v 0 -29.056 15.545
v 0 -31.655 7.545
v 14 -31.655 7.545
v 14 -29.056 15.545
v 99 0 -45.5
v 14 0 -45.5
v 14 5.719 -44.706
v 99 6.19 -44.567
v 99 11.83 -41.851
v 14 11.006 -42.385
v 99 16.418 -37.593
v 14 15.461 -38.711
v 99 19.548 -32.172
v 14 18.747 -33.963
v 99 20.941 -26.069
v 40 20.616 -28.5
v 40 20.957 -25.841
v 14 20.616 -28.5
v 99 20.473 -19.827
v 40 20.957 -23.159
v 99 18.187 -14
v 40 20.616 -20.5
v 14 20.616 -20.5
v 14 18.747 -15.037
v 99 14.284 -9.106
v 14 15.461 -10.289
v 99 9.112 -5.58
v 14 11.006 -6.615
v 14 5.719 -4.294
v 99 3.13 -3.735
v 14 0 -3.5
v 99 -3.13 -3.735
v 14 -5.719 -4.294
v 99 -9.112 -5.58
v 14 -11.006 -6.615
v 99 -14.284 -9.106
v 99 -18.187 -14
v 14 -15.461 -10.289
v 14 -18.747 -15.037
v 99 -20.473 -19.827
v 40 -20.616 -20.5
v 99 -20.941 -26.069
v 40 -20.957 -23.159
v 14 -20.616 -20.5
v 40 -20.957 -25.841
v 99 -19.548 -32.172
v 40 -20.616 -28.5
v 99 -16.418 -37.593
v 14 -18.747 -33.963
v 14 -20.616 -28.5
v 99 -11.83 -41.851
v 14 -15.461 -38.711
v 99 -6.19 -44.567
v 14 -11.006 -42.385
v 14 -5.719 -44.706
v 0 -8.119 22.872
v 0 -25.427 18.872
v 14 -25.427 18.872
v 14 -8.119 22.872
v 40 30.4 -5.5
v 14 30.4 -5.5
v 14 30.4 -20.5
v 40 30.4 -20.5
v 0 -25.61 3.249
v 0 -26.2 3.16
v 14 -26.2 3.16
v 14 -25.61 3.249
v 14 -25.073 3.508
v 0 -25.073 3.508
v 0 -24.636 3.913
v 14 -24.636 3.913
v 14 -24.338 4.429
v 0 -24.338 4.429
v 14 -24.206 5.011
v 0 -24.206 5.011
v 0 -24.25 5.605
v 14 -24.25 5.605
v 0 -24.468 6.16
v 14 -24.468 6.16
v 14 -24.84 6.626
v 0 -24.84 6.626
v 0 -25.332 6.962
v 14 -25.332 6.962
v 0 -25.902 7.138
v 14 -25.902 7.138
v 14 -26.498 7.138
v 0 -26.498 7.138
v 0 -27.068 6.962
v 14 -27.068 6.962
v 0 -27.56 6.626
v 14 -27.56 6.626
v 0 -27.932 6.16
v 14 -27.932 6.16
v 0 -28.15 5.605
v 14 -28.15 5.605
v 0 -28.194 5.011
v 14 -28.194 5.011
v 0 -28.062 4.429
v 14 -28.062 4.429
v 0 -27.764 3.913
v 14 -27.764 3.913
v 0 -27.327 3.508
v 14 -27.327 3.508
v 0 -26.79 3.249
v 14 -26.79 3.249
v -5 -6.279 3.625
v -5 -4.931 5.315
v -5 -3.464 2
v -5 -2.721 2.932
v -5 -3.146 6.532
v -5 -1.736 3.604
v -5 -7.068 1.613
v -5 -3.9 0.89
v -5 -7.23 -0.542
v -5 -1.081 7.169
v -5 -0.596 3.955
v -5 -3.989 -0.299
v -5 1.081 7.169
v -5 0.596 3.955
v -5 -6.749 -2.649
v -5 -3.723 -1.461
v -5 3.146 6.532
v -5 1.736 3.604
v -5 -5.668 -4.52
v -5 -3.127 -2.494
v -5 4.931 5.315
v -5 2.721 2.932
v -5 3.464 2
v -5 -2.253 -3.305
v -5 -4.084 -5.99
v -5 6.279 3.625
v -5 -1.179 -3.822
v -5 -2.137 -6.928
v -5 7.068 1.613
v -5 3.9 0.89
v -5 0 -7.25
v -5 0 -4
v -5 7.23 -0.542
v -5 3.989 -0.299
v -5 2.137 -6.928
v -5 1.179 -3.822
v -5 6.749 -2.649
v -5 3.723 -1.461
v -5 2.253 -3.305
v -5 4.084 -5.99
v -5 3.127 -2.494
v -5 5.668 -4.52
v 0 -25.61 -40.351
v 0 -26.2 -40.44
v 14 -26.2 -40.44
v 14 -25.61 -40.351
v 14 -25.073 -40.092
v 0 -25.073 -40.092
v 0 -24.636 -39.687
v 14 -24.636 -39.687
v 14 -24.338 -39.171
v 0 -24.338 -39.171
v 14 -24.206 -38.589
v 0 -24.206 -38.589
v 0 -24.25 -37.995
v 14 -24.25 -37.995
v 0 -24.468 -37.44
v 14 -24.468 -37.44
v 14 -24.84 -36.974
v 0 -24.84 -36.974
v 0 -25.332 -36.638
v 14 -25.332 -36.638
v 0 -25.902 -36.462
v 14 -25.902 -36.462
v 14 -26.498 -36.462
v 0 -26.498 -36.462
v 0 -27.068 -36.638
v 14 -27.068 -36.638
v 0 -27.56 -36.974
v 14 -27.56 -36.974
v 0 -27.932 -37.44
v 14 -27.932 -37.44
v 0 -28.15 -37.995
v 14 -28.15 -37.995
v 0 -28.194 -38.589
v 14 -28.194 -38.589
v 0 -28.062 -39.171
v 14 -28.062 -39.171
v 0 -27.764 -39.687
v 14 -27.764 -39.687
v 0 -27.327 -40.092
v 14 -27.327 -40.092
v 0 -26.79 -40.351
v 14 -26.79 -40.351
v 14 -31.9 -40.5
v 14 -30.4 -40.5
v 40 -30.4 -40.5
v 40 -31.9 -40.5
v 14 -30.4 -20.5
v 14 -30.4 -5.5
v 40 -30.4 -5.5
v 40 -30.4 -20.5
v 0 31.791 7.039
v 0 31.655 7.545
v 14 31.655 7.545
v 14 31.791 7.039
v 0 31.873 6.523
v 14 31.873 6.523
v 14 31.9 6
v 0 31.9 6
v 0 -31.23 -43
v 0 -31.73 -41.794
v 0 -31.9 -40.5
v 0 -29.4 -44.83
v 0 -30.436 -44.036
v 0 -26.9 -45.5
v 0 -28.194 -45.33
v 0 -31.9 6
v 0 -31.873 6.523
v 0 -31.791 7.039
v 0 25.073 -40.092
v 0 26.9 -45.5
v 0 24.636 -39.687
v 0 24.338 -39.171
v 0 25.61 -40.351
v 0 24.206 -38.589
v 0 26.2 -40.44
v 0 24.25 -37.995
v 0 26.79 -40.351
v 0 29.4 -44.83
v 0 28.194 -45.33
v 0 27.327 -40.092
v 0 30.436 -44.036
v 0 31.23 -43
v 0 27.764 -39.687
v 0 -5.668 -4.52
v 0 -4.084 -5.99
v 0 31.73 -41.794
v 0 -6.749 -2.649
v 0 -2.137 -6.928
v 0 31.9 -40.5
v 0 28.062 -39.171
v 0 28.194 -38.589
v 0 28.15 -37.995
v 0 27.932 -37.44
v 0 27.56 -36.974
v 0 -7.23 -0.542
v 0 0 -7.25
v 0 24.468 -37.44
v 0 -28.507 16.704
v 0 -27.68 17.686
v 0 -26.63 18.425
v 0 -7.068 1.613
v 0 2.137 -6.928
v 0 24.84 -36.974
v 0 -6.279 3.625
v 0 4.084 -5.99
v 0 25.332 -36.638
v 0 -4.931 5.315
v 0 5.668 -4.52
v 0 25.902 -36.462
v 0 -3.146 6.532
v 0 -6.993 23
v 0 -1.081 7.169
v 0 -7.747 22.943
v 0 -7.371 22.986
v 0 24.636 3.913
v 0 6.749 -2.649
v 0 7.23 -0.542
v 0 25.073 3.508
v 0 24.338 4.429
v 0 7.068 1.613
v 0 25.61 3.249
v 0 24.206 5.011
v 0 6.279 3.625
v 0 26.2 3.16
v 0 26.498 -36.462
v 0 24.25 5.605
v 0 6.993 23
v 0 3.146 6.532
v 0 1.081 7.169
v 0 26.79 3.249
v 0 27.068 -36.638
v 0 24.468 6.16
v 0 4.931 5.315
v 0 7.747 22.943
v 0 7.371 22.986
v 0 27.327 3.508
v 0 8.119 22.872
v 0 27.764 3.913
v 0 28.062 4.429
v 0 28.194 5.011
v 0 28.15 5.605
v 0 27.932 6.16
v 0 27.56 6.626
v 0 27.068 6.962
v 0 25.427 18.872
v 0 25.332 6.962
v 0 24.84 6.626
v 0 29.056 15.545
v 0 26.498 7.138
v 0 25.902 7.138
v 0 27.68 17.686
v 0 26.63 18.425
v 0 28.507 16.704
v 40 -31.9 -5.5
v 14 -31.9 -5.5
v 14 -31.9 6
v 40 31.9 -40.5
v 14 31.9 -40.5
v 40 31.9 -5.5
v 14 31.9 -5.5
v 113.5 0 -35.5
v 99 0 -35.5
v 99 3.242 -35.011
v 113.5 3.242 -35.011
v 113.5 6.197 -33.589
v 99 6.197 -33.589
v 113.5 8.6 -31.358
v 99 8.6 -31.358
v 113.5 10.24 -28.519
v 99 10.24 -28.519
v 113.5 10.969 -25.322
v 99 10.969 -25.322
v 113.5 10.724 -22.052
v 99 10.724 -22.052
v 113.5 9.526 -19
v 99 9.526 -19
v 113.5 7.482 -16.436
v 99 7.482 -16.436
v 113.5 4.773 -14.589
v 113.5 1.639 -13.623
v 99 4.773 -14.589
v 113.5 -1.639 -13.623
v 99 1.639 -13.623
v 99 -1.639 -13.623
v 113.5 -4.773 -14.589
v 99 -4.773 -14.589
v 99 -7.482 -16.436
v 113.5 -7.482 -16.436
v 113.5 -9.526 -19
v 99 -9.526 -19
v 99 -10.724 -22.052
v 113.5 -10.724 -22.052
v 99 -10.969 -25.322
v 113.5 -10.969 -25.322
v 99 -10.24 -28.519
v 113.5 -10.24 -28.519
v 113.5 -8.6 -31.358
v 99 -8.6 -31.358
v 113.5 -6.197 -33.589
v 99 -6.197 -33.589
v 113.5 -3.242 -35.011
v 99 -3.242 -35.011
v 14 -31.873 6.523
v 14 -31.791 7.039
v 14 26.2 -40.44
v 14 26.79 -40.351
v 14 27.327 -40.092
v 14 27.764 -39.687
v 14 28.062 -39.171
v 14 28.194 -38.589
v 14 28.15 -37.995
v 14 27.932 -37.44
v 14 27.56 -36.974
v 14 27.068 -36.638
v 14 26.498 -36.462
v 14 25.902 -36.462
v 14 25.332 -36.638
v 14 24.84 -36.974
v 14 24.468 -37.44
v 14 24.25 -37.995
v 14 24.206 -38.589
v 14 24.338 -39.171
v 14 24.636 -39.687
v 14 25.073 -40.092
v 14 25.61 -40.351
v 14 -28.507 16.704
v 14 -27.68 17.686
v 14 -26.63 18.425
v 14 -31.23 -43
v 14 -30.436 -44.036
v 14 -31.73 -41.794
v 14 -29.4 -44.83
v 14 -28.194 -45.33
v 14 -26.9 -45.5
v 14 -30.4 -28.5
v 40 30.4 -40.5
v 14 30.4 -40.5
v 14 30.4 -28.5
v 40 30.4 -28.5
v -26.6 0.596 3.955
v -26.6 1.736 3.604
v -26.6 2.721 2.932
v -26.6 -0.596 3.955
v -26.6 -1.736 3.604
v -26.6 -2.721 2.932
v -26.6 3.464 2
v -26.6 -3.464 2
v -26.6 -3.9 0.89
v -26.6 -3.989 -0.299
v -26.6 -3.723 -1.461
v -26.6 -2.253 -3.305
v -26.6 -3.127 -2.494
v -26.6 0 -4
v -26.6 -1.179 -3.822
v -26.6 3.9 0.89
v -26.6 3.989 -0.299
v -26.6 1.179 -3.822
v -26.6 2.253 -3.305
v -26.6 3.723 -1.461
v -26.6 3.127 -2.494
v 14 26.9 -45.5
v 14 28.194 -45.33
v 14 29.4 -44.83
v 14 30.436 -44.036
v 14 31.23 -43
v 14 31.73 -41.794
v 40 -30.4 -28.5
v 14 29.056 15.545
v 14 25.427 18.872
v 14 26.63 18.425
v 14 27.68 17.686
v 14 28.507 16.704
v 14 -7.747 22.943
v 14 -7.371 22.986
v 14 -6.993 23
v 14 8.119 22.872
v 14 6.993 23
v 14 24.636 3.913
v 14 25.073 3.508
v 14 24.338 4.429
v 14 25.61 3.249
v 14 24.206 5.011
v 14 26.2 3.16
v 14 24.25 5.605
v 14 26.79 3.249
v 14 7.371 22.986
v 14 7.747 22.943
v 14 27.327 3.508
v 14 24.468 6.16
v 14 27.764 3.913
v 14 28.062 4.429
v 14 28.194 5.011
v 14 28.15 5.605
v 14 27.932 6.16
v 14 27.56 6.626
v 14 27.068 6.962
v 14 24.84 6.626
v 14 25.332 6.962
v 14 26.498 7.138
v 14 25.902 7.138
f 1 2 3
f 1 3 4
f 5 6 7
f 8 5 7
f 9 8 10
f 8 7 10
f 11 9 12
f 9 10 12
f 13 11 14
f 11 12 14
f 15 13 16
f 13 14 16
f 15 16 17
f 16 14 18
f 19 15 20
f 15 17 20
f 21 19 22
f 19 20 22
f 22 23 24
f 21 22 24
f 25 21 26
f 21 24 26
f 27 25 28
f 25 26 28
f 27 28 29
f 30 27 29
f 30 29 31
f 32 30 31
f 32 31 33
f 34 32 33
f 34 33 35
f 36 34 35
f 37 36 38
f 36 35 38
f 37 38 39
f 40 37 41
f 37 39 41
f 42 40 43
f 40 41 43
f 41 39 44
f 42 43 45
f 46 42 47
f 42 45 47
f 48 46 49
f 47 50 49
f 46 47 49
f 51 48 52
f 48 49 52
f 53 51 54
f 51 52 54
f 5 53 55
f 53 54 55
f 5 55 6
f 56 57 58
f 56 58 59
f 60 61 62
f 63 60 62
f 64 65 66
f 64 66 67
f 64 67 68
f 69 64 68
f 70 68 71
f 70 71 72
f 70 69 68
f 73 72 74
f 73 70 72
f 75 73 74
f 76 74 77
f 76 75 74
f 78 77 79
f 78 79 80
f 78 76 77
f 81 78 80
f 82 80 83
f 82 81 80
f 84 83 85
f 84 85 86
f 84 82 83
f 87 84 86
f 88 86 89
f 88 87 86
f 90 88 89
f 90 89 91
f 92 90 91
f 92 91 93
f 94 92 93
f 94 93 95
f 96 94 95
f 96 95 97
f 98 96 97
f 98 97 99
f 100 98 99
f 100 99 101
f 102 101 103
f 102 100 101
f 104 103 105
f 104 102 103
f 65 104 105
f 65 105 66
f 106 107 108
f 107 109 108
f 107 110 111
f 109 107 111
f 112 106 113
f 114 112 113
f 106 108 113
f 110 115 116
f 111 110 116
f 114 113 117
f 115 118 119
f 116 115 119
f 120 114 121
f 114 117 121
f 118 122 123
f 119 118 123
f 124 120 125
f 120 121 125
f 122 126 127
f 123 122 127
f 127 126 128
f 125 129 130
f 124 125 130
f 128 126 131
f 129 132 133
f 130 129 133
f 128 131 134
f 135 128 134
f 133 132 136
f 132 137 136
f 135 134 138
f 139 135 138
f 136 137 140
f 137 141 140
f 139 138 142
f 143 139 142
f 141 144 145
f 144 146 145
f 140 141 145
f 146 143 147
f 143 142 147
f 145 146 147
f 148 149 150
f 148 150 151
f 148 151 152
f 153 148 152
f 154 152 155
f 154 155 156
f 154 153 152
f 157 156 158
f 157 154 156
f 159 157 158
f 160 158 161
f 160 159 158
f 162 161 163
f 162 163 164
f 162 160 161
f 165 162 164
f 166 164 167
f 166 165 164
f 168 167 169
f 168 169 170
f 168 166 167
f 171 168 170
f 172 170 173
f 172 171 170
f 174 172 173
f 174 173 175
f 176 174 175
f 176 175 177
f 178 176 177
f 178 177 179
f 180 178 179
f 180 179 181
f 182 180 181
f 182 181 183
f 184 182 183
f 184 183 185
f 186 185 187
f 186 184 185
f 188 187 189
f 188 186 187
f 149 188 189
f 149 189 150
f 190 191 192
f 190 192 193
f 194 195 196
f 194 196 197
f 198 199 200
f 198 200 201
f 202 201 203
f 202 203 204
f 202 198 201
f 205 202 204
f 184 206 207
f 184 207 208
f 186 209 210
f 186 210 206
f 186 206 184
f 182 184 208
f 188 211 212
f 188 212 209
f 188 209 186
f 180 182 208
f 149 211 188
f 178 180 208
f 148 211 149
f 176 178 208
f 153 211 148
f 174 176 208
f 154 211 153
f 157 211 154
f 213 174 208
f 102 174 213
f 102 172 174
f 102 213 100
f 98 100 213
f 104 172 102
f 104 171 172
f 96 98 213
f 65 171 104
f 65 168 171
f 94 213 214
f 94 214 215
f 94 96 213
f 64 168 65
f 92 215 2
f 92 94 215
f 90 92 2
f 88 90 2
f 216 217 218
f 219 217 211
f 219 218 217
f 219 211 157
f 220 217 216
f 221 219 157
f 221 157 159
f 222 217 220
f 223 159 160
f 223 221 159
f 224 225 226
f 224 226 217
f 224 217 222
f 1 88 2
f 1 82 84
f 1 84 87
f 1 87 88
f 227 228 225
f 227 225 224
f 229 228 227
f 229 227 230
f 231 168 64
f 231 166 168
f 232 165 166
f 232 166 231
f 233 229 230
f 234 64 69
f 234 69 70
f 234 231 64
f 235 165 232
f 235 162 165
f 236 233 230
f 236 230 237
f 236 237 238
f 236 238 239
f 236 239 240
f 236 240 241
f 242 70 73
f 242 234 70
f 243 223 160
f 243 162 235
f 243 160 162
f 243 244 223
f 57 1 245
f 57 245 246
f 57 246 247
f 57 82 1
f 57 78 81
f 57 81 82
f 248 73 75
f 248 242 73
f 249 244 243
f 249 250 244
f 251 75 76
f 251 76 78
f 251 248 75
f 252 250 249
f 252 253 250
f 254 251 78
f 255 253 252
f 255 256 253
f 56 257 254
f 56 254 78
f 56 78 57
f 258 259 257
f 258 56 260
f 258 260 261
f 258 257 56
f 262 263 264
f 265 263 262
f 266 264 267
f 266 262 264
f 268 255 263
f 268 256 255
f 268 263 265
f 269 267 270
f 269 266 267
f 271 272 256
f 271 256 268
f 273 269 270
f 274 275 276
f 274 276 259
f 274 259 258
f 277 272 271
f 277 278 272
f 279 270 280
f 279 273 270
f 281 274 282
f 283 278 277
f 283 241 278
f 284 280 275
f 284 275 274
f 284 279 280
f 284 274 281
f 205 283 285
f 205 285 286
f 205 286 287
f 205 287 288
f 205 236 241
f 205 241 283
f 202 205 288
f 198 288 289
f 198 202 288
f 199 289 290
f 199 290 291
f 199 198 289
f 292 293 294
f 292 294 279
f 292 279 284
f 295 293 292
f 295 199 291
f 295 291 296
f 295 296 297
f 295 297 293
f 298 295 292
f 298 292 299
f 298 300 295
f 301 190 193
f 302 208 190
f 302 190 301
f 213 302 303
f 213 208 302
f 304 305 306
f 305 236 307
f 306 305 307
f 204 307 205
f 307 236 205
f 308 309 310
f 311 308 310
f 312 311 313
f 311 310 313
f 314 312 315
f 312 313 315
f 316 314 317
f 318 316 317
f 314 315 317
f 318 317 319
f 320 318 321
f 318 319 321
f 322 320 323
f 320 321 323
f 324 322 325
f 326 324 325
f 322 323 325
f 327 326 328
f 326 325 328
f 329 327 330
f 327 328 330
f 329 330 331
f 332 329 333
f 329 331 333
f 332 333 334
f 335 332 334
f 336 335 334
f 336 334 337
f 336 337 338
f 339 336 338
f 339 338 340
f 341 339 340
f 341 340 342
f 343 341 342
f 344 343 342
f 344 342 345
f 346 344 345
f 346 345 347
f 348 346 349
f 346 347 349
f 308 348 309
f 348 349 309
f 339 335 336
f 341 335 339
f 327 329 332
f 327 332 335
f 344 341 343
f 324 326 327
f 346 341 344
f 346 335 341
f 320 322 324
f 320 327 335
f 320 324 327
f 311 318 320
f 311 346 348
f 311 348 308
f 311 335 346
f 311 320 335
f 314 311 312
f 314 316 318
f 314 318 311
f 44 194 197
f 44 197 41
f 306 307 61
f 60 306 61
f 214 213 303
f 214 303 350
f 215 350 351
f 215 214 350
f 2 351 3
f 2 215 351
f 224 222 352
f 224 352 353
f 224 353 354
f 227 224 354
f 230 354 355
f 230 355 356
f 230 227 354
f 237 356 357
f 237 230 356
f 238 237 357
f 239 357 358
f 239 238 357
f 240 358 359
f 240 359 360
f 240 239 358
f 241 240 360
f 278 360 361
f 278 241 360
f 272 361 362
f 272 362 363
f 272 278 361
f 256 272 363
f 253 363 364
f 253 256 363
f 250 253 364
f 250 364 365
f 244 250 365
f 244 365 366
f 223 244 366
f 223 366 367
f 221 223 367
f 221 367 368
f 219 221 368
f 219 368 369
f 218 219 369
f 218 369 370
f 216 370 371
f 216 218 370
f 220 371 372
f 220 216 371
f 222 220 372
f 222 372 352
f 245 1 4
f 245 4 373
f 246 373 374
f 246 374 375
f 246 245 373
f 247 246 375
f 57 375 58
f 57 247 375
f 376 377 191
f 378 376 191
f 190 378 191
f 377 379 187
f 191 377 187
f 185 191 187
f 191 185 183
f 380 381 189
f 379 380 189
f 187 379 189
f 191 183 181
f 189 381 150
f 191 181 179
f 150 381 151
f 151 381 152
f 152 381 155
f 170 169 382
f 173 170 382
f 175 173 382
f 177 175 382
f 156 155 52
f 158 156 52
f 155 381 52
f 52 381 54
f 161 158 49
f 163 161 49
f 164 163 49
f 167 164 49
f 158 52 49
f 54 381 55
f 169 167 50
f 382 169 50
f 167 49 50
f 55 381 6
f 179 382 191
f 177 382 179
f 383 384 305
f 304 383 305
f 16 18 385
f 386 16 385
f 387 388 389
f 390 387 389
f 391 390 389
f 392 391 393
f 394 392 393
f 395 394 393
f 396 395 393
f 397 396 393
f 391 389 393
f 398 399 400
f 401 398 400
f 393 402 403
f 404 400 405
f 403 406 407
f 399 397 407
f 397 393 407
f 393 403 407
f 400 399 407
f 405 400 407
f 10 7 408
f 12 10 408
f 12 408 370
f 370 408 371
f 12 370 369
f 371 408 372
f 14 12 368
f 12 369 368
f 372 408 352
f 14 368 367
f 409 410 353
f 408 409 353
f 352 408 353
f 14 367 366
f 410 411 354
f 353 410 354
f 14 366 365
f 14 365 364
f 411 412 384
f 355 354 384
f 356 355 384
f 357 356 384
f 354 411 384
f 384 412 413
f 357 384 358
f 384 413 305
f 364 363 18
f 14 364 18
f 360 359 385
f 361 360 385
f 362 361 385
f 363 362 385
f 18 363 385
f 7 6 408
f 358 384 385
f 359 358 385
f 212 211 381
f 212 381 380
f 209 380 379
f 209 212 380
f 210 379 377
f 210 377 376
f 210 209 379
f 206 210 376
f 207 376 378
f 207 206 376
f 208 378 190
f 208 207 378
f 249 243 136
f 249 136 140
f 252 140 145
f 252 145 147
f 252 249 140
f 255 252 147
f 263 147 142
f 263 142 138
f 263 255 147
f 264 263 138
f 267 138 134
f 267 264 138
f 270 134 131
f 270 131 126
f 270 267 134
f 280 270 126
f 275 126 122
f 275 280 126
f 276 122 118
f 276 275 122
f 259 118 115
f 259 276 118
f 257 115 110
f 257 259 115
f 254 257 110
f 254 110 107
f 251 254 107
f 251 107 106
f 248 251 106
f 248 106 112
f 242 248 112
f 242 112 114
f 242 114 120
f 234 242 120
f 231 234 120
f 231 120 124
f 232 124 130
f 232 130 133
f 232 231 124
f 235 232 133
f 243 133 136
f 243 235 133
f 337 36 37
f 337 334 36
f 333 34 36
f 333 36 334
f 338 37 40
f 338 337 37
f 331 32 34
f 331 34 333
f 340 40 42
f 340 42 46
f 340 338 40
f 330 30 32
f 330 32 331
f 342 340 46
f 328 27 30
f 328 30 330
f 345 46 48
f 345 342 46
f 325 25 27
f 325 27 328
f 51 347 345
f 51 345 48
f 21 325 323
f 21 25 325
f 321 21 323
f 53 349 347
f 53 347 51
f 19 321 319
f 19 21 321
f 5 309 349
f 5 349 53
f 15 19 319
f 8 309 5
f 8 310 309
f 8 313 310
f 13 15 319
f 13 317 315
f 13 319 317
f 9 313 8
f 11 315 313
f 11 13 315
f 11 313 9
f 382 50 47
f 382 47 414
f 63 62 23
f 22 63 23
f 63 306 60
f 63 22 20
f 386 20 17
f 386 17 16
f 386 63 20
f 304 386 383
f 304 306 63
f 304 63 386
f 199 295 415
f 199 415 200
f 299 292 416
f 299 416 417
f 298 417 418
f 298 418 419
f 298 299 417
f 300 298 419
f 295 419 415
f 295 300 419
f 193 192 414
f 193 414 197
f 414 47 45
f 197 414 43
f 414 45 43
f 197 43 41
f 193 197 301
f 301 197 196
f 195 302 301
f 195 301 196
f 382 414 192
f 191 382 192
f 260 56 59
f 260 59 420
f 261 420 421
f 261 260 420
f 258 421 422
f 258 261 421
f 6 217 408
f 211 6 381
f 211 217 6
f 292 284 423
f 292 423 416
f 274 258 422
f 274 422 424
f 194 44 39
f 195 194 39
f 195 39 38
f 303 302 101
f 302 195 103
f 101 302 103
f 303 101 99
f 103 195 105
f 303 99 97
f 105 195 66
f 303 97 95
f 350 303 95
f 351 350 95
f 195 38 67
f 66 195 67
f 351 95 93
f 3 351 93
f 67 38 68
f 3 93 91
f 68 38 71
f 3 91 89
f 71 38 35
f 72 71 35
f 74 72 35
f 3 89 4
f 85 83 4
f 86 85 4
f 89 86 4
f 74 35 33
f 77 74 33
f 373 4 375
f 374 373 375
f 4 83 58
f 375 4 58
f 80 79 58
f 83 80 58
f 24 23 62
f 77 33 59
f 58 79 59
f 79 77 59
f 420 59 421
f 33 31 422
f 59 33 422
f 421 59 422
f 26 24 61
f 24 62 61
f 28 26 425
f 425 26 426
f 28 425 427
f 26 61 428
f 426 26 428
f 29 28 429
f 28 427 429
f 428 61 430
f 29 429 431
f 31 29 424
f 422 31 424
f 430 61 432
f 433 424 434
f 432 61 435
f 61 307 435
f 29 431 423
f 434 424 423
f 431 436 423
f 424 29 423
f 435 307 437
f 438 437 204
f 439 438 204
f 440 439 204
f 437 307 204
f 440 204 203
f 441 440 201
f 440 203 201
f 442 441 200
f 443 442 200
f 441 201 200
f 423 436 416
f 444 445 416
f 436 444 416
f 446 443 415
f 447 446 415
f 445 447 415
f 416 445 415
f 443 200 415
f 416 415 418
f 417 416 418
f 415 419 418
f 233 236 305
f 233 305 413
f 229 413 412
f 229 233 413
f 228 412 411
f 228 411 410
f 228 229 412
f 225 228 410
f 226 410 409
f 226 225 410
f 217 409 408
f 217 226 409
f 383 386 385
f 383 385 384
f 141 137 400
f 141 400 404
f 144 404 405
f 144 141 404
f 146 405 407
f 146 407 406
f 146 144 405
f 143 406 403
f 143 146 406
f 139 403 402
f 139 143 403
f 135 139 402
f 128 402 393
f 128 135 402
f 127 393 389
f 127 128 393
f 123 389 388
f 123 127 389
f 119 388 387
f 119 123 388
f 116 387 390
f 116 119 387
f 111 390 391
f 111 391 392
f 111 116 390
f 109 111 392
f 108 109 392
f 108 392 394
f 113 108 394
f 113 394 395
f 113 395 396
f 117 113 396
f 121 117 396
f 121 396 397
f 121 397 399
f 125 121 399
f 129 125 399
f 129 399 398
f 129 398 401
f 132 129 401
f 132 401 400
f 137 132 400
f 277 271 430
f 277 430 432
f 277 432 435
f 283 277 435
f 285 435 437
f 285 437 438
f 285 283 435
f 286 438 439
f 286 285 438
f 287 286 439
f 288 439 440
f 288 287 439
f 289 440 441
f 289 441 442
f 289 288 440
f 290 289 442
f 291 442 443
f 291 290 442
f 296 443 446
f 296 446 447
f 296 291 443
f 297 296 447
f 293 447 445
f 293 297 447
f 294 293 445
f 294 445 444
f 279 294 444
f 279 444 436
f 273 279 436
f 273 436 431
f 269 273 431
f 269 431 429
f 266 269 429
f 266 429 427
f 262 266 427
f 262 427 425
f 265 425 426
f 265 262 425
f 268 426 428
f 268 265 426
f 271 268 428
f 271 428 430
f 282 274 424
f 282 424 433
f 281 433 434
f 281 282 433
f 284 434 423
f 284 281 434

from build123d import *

# Parameters (mm, degrees)
ESQUISSE1_R       = 2
EXTRUSION3_DEPTH  = 14
ESQUISSE3_R       = 21
EXTRUSION4_DEPTH  = 85
ESQUISSE4_R       = 4
EXTRUSION5_DEPTH  = 26.6
ESQUISSE5_R       = 7.25
EXTRUSION6_DEPTH  = 5
EXTRUSION9_DEPTH  = 26
ESQUISSE9_R       = 11
EXTRUSION10_DEPTH = 14.5


with BuildPart() as part:
    # Esquisse1 → Extrusion3 (new body)
    with BuildSketch(Plane(origin=(0, 0, 0), x_dir=(0, 0, -1), z_dir=(1, 0, 0))):
        with BuildLine():
            Line((-6, 31.9), (40.5, 31.9))
            ThreePointArc((40.5, 31.9), (44.035533906, 30.435533906), (45.5, 26.9))
            Line((45.5, 26.9), (45.5, -26.9))
            ThreePointArc((45.5, -26.9), (44.035533906, -30.435533906), (40.5, -31.9))
            Line((40.5, -31.9), (-6, -31.9))
            ThreePointArc((-6, -31.9), (-6.782039696, -31.838462708), (-7.54482955, -31.655365566))
            Line((-7.54482955, -31.655365566), (-15.54482955, -29.056483056))
            ThreePointArc((-15.54482955, -29.056483056), (-17.685916108, -27.679581999), (-18.871597264, -25.426968324))
            Line((-18.871597264, -25.426968324), (-22.871597264, -8.118823709))
            ThreePointArc((-22.871597264, -8.118823709), (-22.967795604, -7.559547531), (-23, -6.992972875))
            Line((-23, -6.992972875), (-23, 6.992972875))
            ThreePointArc((-23, 6.992972875), (-22.967795604, 7.559547531), (-22.871597264, 8.118823709))
            Line((-22.871597264, 8.118823709), (-18.871597264, 25.426968324))
            ThreePointArc((-18.871597264, 25.426968324), (-17.685916108, 27.679581999), (-15.54482955, 29.056483056))
            Line((-15.54482955, 29.056483056), (-7.54482955, 31.655365566))
            ThreePointArc((-7.54482955, 31.655365566), (-6.782039696, 31.838462708), (-6, 31.9))
        make_face()
        with Locations((38.44, -26.2)):
            Circle(ESQUISSE1_R, mode=Mode.SUBTRACT)
        with Locations((-5.16, -26.2)):
            Circle(ESQUISSE1_R, mode=Mode.SUBTRACT)
        with Locations((-5.16, 26.2)):
            Circle(ESQUISSE1_R, mode=Mode.SUBTRACT)
        with Locations((38.44, 26.2)):
            Circle(ESQUISSE1_R, mode=Mode.SUBTRACT)
    extrude(amount=EXTRUSION3_DEPTH)

    # Esquisse3 → Extrusion4 (add)
    with BuildSketch(Plane(origin=(14, 0, 0), x_dir=(0, 0, -1), z_dir=(1, 0, 0))):
        with Locations((24.5, 0)):
            Circle(ESQUISSE3_R)
    extrude(amount=EXTRUSION4_DEPTH)

    # Esquisse4 → Extrusion5 (add)
    with BuildSketch(Plane(origin=(0, 0, 0), x_dir=(0, 0, -1), z_dir=(1, 0, 0))):
        Circle(ESQUISSE4_R)
    extrude(amount=-EXTRUSION5_DEPTH)

    # Esquisse5 → Extrusion6 (add)
    with BuildSketch(Plane(origin=(0, 0, 0), x_dir=(0, 0, -1), z_dir=(1, 0, 0))):
        Circle(ESQUISSE5_R)
    extrude(amount=-EXTRUSION6_DEPTH)

    # Esquisse8 → Extrusion9 (add)
    with BuildSketch(Plane(origin=(14, 0, 0), x_dir=(0, 0, -1), z_dir=(1, 0, 0))):
        Polygon((40.5, 31.9), (5.5, 31.9), (5.5, 30.4), (20.5, 30.4), (20.5, 13.147221685), (28.5, 13.147221685), (28.5, 30.4), (40.5, 30.4), align=None)
        Polygon((40.5, -30.4), (40.5, -31.9), (5.5, -31.9), (5.5, -30.4), (20.5, -30.4), (20.5, -13.147221685), (28.5, -13.147221685), (28.5, -30.4), align=None)
    extrude(amount=EXTRUSION9_DEPTH)

    # Esquisse9 → Extrusion10 (add)
    with BuildSketch(Plane(origin=(99, 0, 0), x_dir=(0, 0, -1), z_dir=(1, 0, 0))):
        with Locations((24.5, 0)):
            Circle(ESQUISSE9_R)
    extrude(amount=EXTRUSION10_DEPTH)


solid = part.part
